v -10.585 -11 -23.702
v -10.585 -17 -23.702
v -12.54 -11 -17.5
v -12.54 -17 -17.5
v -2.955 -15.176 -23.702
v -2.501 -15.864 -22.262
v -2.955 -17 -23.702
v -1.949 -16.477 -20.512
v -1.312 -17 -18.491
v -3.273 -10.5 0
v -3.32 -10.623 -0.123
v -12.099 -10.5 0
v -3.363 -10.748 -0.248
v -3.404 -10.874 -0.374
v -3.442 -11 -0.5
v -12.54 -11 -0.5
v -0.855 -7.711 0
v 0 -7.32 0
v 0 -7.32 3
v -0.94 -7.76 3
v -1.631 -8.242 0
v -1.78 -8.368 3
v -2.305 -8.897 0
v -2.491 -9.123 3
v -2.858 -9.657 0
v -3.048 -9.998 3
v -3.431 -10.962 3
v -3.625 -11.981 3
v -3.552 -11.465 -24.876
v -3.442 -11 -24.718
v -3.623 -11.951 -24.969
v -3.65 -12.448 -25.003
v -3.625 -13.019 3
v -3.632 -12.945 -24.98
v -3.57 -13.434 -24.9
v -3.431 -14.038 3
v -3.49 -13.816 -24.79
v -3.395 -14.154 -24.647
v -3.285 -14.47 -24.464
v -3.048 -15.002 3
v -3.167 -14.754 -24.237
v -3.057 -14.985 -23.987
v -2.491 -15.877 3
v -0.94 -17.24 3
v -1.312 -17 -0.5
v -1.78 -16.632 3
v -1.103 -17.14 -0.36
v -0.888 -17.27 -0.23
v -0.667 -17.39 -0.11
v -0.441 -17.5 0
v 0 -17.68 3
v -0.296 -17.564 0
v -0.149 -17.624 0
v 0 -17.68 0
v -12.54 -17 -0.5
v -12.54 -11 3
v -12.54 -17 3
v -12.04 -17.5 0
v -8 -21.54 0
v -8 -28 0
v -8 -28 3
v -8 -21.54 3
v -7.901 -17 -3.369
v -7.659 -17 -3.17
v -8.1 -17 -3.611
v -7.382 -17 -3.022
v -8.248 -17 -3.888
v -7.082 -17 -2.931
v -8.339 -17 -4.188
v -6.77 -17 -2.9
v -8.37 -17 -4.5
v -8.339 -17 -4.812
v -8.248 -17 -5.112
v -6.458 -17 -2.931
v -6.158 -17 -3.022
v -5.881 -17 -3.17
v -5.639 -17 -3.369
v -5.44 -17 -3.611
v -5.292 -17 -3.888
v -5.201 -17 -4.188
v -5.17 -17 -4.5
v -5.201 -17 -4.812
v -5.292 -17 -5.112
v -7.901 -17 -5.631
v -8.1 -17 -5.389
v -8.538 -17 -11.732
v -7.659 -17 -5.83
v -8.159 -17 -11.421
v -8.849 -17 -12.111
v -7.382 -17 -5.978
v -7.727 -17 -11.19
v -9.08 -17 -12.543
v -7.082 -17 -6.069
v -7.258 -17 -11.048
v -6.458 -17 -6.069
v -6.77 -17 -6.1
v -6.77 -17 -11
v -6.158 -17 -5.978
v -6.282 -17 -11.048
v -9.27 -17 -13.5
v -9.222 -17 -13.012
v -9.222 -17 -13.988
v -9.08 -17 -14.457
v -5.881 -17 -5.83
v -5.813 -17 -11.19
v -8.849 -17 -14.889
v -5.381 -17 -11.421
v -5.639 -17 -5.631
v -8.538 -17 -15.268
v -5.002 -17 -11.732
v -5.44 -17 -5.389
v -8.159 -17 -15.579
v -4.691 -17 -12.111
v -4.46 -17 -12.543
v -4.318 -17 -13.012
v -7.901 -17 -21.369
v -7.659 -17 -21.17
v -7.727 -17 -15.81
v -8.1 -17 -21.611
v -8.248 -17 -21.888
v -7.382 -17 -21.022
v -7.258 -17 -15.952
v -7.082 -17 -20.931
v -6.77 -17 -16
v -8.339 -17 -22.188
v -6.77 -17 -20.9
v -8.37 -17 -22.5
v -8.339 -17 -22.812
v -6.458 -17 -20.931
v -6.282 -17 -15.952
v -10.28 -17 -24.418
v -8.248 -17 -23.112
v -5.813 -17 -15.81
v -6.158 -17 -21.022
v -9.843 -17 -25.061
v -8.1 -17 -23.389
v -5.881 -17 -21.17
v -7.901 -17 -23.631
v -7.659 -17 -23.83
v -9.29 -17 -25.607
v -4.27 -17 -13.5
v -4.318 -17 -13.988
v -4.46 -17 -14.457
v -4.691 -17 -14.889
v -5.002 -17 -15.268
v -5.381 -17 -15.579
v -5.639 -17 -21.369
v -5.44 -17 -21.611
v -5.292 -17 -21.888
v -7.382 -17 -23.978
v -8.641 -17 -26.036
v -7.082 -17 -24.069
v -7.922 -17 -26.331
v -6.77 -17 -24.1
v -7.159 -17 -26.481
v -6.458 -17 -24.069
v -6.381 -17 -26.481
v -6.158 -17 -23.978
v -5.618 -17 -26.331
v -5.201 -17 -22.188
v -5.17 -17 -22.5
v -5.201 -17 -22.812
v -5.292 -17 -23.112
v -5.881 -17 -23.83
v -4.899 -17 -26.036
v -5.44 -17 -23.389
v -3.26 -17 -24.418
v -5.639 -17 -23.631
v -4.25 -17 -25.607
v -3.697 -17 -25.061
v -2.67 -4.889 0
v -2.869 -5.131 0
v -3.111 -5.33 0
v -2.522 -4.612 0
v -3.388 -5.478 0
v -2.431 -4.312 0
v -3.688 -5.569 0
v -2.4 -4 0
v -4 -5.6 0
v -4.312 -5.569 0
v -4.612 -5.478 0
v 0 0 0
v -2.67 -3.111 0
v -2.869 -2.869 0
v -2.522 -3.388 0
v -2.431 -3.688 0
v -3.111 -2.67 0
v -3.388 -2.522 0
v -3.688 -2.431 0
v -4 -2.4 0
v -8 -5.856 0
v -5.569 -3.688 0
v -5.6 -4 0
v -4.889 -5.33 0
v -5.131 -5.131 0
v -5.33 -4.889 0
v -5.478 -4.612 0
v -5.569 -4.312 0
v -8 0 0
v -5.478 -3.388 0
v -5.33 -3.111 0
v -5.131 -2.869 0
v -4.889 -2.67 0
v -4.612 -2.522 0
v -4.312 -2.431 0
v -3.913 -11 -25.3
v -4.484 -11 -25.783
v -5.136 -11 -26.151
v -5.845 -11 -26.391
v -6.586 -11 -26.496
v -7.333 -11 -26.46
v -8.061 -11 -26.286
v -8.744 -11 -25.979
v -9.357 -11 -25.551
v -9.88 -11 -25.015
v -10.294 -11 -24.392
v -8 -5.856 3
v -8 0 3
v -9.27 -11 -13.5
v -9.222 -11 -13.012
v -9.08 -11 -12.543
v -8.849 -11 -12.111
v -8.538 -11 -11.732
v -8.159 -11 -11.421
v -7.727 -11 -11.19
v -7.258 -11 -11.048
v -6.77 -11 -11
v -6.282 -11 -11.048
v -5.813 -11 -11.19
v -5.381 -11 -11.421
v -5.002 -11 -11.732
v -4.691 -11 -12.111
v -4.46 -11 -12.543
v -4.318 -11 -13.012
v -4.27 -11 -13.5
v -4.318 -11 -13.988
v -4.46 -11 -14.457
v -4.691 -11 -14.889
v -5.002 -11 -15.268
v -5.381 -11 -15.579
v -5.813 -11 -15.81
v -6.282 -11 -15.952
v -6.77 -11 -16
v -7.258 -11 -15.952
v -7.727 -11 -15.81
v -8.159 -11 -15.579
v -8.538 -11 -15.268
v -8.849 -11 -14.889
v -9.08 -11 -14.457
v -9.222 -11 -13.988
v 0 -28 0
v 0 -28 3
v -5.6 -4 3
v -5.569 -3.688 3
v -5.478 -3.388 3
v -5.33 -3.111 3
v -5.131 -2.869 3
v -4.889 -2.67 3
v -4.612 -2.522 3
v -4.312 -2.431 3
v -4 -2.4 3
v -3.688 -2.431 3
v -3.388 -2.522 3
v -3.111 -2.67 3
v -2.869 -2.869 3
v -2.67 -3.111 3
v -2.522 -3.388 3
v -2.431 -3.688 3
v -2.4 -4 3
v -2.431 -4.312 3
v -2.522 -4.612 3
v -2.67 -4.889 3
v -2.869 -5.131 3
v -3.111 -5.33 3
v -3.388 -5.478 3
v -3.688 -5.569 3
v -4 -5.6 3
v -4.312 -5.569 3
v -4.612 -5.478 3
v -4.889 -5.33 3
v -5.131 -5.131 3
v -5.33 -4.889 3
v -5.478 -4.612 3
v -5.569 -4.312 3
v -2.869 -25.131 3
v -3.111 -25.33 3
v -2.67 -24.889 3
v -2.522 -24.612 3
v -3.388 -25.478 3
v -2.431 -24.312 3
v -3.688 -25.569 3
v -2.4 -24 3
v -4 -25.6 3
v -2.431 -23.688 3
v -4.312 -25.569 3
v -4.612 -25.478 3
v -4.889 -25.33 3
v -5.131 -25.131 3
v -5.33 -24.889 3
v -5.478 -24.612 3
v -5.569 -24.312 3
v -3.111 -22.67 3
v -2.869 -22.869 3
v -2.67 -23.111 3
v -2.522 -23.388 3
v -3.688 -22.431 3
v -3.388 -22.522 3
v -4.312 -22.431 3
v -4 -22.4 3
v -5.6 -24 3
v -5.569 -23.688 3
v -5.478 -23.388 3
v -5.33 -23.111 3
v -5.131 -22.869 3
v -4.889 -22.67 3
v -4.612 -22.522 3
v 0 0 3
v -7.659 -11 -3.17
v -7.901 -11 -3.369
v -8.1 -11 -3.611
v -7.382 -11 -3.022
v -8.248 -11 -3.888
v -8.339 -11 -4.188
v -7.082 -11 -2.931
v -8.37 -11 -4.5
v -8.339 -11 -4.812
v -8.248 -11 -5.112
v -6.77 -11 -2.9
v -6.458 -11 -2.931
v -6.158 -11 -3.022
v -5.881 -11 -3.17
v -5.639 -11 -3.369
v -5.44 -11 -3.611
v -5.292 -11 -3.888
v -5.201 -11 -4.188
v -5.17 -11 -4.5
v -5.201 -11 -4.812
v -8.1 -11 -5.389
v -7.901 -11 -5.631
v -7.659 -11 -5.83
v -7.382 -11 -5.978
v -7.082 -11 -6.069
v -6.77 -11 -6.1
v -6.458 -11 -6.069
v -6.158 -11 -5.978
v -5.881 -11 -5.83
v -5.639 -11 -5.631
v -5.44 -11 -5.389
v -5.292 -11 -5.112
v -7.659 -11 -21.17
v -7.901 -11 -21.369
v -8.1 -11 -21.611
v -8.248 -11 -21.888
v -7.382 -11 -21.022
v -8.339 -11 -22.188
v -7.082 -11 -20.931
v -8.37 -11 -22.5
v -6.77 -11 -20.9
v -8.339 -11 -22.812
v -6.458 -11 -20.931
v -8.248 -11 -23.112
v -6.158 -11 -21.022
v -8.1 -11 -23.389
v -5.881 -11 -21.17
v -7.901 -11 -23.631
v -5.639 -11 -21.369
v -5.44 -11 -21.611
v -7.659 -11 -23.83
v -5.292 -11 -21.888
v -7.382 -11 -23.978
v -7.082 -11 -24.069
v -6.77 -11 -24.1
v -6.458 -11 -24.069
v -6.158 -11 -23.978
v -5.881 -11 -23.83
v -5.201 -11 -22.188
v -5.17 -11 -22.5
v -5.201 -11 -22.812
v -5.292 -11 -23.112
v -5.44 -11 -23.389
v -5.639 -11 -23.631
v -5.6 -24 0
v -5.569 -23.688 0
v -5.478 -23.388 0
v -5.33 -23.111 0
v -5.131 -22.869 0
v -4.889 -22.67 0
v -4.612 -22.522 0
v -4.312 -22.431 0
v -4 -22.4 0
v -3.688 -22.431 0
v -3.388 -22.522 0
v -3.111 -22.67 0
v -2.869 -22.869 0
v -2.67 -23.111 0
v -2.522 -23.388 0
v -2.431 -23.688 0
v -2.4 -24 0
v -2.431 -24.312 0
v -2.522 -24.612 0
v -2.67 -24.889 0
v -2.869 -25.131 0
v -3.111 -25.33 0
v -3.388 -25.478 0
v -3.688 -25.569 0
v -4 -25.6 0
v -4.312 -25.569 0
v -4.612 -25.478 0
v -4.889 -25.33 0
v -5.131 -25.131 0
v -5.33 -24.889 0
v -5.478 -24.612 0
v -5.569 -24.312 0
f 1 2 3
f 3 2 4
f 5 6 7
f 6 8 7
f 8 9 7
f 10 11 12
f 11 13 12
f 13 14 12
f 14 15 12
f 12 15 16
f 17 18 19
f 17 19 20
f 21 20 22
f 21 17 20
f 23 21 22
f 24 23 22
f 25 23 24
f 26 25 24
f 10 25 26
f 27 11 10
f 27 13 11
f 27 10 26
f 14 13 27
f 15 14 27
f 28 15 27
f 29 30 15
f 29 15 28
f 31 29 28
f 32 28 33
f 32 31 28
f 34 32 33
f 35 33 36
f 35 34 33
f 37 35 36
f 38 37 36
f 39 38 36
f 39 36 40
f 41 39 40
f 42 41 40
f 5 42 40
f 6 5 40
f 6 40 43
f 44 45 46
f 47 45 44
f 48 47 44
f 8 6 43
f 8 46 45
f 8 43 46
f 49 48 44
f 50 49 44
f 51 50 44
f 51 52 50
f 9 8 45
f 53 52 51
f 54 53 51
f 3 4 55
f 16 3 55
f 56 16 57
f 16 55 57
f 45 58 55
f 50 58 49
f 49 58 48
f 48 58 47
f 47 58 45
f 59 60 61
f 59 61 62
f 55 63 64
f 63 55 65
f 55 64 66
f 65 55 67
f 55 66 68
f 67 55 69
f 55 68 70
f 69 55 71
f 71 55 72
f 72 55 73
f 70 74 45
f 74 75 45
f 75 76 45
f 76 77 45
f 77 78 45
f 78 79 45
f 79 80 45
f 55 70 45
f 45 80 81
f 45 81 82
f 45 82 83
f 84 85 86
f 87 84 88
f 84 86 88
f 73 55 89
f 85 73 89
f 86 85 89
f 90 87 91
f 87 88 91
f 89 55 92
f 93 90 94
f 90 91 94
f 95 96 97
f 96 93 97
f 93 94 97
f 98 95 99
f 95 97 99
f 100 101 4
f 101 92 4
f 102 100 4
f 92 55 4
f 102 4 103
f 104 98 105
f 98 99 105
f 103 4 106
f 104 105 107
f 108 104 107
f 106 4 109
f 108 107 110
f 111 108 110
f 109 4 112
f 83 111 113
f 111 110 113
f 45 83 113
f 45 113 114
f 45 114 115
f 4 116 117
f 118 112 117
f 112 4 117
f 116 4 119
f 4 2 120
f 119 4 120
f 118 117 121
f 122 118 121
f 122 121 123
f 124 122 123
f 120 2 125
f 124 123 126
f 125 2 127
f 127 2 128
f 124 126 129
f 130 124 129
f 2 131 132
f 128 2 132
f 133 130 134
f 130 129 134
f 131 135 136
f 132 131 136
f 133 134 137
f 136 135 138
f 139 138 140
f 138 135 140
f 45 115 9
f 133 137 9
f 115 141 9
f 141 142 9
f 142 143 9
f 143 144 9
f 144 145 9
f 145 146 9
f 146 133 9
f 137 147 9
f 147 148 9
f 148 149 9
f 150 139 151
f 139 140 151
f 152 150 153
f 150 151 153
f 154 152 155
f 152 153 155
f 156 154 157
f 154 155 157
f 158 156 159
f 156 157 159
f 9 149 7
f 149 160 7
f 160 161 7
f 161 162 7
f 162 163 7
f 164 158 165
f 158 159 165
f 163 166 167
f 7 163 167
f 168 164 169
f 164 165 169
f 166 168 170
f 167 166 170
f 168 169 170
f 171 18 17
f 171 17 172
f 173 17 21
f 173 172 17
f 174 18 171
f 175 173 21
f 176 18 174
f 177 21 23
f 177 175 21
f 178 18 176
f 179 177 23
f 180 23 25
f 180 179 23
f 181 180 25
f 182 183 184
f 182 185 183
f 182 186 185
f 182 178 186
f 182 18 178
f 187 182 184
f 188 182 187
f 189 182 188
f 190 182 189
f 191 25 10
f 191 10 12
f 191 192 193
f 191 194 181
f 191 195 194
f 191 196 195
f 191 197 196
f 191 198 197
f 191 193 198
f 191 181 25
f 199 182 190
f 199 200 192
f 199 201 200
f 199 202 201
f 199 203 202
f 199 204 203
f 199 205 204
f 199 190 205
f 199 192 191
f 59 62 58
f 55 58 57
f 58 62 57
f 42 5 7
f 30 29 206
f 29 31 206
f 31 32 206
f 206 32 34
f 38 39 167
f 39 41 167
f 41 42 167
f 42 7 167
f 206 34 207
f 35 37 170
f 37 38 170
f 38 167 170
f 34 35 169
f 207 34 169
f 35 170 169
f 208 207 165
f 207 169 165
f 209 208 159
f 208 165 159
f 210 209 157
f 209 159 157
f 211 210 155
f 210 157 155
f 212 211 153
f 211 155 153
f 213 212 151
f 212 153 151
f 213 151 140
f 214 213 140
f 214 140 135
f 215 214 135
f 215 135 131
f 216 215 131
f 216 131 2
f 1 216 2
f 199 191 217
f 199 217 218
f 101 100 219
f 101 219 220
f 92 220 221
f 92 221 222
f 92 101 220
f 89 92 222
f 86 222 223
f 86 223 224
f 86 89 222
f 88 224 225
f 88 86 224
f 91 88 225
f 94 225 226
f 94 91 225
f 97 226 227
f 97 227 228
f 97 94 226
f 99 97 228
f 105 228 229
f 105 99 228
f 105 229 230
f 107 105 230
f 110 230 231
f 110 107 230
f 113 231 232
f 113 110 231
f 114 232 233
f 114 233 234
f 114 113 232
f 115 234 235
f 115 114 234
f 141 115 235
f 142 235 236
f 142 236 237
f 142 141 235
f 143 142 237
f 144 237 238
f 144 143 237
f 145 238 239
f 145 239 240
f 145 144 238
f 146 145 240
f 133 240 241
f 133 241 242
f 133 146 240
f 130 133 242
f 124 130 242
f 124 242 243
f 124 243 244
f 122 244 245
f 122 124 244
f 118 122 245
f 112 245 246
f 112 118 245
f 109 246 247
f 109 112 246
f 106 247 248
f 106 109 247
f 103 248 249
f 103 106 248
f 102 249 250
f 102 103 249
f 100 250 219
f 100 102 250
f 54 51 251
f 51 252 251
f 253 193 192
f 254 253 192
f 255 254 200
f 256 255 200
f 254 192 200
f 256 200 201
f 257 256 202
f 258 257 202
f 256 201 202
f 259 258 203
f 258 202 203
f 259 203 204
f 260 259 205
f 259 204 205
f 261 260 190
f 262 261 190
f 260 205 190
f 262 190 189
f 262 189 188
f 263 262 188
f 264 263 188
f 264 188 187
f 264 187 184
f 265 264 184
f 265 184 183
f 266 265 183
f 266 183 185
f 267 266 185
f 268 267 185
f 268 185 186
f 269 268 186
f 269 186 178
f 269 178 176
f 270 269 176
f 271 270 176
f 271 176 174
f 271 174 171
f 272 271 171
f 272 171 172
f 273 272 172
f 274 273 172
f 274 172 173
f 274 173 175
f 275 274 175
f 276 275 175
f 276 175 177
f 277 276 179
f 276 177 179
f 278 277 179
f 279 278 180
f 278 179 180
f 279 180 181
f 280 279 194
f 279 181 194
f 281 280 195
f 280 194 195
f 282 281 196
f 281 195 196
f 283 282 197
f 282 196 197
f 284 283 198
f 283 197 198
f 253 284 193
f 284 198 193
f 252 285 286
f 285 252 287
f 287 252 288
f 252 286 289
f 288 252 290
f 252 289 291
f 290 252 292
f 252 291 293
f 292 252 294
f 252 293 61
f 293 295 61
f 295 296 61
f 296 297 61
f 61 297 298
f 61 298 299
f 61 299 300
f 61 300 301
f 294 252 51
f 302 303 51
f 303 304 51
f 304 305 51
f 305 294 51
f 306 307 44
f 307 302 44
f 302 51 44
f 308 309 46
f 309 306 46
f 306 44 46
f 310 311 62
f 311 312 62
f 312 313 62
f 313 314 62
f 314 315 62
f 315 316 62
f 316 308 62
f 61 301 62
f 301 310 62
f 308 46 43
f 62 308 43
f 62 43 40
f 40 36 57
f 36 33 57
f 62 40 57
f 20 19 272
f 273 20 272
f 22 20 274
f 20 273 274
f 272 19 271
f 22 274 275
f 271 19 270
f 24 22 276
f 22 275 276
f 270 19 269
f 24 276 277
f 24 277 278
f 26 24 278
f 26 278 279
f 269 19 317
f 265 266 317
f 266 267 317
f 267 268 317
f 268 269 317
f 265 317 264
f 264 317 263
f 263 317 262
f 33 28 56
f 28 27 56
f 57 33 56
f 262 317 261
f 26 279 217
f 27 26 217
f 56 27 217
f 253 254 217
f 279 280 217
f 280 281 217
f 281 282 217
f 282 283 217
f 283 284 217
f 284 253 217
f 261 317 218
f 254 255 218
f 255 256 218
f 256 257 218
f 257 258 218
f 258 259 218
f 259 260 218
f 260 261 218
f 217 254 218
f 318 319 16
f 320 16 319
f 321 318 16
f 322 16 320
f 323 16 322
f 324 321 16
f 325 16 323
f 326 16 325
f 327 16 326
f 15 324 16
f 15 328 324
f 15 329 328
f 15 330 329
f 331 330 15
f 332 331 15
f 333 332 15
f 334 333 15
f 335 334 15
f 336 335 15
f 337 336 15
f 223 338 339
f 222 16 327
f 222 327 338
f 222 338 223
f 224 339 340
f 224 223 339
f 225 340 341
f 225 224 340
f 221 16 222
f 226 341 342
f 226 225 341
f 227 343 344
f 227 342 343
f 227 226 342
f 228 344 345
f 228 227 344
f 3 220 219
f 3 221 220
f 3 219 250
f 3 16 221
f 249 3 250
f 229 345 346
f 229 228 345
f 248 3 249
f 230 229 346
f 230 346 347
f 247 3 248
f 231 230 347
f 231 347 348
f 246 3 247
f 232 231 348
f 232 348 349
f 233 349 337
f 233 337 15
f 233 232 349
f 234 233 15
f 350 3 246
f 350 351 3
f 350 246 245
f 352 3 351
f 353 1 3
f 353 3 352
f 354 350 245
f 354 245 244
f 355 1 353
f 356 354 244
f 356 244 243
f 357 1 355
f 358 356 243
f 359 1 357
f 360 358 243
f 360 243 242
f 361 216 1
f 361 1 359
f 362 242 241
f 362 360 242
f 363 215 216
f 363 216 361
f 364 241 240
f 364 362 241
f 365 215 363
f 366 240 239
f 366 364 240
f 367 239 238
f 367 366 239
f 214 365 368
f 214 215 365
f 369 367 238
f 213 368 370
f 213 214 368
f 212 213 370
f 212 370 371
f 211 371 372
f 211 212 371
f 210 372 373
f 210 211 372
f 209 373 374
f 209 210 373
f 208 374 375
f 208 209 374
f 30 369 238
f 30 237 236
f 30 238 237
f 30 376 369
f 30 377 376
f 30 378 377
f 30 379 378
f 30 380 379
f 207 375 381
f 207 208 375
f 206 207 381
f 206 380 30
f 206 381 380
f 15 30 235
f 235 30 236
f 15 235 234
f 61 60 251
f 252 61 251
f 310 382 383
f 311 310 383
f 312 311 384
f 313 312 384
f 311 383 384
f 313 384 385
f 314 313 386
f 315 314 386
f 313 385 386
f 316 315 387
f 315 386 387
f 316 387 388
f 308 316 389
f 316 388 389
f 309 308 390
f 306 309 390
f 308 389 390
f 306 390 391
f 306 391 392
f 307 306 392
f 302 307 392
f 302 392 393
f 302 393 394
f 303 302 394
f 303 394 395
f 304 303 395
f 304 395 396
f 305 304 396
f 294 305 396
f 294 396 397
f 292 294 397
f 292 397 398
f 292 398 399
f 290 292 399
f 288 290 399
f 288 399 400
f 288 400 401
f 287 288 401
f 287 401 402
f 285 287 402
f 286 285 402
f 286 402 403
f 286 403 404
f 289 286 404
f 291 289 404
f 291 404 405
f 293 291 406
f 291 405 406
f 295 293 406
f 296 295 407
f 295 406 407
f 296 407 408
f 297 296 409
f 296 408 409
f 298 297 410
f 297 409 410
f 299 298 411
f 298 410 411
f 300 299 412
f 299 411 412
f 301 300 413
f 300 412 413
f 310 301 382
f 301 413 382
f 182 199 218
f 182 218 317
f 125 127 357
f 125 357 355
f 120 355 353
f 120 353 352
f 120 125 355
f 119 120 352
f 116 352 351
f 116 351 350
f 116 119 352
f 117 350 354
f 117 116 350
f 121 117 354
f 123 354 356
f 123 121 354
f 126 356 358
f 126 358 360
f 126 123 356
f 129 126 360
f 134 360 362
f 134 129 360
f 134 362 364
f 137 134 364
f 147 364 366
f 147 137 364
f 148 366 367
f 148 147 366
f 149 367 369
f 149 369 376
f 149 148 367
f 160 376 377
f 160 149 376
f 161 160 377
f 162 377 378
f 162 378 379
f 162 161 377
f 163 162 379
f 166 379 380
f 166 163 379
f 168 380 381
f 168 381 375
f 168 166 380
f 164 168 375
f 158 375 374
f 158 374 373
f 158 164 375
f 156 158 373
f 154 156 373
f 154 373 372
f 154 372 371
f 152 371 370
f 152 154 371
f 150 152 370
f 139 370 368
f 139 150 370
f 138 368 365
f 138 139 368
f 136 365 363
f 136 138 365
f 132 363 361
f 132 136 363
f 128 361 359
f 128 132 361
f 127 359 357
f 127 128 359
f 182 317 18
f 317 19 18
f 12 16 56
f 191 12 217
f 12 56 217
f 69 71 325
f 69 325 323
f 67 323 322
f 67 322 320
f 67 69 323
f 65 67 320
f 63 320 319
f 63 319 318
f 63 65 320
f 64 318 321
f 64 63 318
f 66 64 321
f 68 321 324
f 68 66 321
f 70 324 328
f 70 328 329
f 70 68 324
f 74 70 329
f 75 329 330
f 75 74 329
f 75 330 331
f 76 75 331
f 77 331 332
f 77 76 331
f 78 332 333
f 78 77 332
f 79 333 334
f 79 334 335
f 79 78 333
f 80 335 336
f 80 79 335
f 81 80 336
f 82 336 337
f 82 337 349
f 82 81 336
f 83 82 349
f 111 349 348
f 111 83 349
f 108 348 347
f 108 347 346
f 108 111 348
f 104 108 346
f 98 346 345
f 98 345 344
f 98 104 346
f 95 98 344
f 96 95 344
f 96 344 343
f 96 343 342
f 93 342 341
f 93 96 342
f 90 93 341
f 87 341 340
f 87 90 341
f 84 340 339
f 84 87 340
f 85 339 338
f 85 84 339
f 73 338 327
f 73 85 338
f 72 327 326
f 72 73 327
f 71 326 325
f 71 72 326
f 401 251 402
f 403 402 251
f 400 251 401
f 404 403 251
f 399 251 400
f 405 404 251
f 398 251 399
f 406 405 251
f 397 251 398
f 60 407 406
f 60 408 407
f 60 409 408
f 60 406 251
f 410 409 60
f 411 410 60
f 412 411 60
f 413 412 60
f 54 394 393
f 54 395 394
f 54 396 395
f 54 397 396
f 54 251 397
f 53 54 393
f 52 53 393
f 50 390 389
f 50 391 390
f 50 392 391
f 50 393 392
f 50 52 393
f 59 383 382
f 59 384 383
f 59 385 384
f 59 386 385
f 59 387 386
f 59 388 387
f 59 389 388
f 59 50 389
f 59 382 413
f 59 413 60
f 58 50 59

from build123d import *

# Parameters (mm, degrees)
SKETCH_1_W               = 8
SKETCH_1_H               = 28
EXTRUDE_1_DEPTH          = 3
EXTRUDE_2_DEPTH          = 3
EXTRUDE_2_DEPTH_BACK     = 3
SKETCH_2_R               = 1.6
SKETCH_2_R_2             = 2.5
CUT_EXTRUDE_1_DEPTH      = 43.561738686
CUT_EXTRUDE_1_DEPTH_BACK = 43.561738686
SKETCH_3_R               = 5.5
EXTRUDE_3_DEPTH          = 3
SKETCH_6_R               = 1.6
CUT_EXTRUDE_2_DEPTH      = 41.5401234
CHAMFER_1_SIZE           = 0.5


with BuildPart() as part:
    # Эскиз1 → Бобышка-Вытянуть1 (new body)
    with BuildSketch(Plane.XY):
        with Locations((-4, -14)):
            Rectangle(SKETCH_1_W, SKETCH_1_H)
    extrude(amount=EXTRUDE_1_DEPTH)

    # Эскиз2 → Бобышка-Вытянуть2 (add, two sides: drawn at the far end of the back side and taken through both)
    with BuildSketch(Plane(origin=(0, -14, 0), x_dir=(1, 0, 0), z_dir=(0, 1, 0)).offset(-EXTRUDE_2_DEPTH_BACK)):
        with BuildLine():
            Line((-1, 9.5), (-1, 17.5))
            Line((-1, 17.5), (-2.955024535, 23.702481686))
            ThreePointArc((-2.955024535, 23.702481686), (-6.77, 26.5), (-10.584975465, 23.702481686))
            Line((-10.584975465, 23.702481686), (-12.54, 17.5))
            Line((-12.54, 17.5), (-12.54, 9.5))
            Line((-12.54, 9.5), (-12.54, -3))
            Line((-12.54, -3), (0, -3))
            Line((0, -3), (0, 0))
            Line((0, 0), (-1, 0))
            Line((-1, 0), (-1, 9.5))
        make_face()
        with Locations(Location((-6.77, 22.5, 0), (0, 0, 180))):
            Circle(SKETCH_2_R, mode=Mode.SUBTRACT)
        with Locations(Location((-6.77, 4.5, 0), (0, 0, 180))):
            Circle(SKETCH_2_R, mode=Mode.SUBTRACT)
        with Locations(Location((-6.77, 13.5, 0), (0, 0, 180))):
            Circle(SKETCH_2_R_2, mode=Mode.SUBTRACT)
    extrude(amount=EXTRUDE_2_DEPTH + EXTRUDE_2_DEPTH_BACK)

    # Эскиз3 → Вырез-Вытянуть1 (cut, two sides: drawn at the far end of the back side and taken through both)
    with BuildSketch(Plane.XY.offset(3).offset(-CUT_EXTRUDE_1_DEPTH_BACK)):
        with Locations((1.85, -12.5)):
            Circle(SKETCH_3_R)
    extrude(amount=CUT_EXTRUDE_1_DEPTH + CUT_EXTRUDE_1_DEPTH_BACK, mode=Mode.SUBTRACT)

    # Эскиз4 → Бобышка-Вытянуть3 (add)
    with BuildSketch(Plane.XY.offset(3)):
        Polygon((-12.54, -11), (-8, -5.855638374), (-8, -21.54), (-12.54, -17), align=None)
    extrude(amount=-EXTRUDE_3_DEPTH)

    # Эскиз6 → Вырез-Вытянуть2 (cut, through all)
    with BuildSketch(Plane(origin=(0, 0, 0), x_dir=(-1, 0, 0), z_dir=(0, 0, -1))):
        with Locations((4, -4)):
            Circle(SKETCH_6_R)
        with Locations((4, -24)):
            Circle(SKETCH_6_R)
    extrude(amount=-CUT_EXTRUDE_2_DEPTH, mode=Mode.SUBTRACT)

    # Фаска1
    chamfer_1_edges = [part.edges().sort_by_distance(p)[0] for p in [
        (-6.92613883, -17, 0),
        (-7.990751311, -11, 0),
    ]]
    chamfer(chamfer_1_edges, length=CHAMFER_1_SIZE)


solid = part.part
